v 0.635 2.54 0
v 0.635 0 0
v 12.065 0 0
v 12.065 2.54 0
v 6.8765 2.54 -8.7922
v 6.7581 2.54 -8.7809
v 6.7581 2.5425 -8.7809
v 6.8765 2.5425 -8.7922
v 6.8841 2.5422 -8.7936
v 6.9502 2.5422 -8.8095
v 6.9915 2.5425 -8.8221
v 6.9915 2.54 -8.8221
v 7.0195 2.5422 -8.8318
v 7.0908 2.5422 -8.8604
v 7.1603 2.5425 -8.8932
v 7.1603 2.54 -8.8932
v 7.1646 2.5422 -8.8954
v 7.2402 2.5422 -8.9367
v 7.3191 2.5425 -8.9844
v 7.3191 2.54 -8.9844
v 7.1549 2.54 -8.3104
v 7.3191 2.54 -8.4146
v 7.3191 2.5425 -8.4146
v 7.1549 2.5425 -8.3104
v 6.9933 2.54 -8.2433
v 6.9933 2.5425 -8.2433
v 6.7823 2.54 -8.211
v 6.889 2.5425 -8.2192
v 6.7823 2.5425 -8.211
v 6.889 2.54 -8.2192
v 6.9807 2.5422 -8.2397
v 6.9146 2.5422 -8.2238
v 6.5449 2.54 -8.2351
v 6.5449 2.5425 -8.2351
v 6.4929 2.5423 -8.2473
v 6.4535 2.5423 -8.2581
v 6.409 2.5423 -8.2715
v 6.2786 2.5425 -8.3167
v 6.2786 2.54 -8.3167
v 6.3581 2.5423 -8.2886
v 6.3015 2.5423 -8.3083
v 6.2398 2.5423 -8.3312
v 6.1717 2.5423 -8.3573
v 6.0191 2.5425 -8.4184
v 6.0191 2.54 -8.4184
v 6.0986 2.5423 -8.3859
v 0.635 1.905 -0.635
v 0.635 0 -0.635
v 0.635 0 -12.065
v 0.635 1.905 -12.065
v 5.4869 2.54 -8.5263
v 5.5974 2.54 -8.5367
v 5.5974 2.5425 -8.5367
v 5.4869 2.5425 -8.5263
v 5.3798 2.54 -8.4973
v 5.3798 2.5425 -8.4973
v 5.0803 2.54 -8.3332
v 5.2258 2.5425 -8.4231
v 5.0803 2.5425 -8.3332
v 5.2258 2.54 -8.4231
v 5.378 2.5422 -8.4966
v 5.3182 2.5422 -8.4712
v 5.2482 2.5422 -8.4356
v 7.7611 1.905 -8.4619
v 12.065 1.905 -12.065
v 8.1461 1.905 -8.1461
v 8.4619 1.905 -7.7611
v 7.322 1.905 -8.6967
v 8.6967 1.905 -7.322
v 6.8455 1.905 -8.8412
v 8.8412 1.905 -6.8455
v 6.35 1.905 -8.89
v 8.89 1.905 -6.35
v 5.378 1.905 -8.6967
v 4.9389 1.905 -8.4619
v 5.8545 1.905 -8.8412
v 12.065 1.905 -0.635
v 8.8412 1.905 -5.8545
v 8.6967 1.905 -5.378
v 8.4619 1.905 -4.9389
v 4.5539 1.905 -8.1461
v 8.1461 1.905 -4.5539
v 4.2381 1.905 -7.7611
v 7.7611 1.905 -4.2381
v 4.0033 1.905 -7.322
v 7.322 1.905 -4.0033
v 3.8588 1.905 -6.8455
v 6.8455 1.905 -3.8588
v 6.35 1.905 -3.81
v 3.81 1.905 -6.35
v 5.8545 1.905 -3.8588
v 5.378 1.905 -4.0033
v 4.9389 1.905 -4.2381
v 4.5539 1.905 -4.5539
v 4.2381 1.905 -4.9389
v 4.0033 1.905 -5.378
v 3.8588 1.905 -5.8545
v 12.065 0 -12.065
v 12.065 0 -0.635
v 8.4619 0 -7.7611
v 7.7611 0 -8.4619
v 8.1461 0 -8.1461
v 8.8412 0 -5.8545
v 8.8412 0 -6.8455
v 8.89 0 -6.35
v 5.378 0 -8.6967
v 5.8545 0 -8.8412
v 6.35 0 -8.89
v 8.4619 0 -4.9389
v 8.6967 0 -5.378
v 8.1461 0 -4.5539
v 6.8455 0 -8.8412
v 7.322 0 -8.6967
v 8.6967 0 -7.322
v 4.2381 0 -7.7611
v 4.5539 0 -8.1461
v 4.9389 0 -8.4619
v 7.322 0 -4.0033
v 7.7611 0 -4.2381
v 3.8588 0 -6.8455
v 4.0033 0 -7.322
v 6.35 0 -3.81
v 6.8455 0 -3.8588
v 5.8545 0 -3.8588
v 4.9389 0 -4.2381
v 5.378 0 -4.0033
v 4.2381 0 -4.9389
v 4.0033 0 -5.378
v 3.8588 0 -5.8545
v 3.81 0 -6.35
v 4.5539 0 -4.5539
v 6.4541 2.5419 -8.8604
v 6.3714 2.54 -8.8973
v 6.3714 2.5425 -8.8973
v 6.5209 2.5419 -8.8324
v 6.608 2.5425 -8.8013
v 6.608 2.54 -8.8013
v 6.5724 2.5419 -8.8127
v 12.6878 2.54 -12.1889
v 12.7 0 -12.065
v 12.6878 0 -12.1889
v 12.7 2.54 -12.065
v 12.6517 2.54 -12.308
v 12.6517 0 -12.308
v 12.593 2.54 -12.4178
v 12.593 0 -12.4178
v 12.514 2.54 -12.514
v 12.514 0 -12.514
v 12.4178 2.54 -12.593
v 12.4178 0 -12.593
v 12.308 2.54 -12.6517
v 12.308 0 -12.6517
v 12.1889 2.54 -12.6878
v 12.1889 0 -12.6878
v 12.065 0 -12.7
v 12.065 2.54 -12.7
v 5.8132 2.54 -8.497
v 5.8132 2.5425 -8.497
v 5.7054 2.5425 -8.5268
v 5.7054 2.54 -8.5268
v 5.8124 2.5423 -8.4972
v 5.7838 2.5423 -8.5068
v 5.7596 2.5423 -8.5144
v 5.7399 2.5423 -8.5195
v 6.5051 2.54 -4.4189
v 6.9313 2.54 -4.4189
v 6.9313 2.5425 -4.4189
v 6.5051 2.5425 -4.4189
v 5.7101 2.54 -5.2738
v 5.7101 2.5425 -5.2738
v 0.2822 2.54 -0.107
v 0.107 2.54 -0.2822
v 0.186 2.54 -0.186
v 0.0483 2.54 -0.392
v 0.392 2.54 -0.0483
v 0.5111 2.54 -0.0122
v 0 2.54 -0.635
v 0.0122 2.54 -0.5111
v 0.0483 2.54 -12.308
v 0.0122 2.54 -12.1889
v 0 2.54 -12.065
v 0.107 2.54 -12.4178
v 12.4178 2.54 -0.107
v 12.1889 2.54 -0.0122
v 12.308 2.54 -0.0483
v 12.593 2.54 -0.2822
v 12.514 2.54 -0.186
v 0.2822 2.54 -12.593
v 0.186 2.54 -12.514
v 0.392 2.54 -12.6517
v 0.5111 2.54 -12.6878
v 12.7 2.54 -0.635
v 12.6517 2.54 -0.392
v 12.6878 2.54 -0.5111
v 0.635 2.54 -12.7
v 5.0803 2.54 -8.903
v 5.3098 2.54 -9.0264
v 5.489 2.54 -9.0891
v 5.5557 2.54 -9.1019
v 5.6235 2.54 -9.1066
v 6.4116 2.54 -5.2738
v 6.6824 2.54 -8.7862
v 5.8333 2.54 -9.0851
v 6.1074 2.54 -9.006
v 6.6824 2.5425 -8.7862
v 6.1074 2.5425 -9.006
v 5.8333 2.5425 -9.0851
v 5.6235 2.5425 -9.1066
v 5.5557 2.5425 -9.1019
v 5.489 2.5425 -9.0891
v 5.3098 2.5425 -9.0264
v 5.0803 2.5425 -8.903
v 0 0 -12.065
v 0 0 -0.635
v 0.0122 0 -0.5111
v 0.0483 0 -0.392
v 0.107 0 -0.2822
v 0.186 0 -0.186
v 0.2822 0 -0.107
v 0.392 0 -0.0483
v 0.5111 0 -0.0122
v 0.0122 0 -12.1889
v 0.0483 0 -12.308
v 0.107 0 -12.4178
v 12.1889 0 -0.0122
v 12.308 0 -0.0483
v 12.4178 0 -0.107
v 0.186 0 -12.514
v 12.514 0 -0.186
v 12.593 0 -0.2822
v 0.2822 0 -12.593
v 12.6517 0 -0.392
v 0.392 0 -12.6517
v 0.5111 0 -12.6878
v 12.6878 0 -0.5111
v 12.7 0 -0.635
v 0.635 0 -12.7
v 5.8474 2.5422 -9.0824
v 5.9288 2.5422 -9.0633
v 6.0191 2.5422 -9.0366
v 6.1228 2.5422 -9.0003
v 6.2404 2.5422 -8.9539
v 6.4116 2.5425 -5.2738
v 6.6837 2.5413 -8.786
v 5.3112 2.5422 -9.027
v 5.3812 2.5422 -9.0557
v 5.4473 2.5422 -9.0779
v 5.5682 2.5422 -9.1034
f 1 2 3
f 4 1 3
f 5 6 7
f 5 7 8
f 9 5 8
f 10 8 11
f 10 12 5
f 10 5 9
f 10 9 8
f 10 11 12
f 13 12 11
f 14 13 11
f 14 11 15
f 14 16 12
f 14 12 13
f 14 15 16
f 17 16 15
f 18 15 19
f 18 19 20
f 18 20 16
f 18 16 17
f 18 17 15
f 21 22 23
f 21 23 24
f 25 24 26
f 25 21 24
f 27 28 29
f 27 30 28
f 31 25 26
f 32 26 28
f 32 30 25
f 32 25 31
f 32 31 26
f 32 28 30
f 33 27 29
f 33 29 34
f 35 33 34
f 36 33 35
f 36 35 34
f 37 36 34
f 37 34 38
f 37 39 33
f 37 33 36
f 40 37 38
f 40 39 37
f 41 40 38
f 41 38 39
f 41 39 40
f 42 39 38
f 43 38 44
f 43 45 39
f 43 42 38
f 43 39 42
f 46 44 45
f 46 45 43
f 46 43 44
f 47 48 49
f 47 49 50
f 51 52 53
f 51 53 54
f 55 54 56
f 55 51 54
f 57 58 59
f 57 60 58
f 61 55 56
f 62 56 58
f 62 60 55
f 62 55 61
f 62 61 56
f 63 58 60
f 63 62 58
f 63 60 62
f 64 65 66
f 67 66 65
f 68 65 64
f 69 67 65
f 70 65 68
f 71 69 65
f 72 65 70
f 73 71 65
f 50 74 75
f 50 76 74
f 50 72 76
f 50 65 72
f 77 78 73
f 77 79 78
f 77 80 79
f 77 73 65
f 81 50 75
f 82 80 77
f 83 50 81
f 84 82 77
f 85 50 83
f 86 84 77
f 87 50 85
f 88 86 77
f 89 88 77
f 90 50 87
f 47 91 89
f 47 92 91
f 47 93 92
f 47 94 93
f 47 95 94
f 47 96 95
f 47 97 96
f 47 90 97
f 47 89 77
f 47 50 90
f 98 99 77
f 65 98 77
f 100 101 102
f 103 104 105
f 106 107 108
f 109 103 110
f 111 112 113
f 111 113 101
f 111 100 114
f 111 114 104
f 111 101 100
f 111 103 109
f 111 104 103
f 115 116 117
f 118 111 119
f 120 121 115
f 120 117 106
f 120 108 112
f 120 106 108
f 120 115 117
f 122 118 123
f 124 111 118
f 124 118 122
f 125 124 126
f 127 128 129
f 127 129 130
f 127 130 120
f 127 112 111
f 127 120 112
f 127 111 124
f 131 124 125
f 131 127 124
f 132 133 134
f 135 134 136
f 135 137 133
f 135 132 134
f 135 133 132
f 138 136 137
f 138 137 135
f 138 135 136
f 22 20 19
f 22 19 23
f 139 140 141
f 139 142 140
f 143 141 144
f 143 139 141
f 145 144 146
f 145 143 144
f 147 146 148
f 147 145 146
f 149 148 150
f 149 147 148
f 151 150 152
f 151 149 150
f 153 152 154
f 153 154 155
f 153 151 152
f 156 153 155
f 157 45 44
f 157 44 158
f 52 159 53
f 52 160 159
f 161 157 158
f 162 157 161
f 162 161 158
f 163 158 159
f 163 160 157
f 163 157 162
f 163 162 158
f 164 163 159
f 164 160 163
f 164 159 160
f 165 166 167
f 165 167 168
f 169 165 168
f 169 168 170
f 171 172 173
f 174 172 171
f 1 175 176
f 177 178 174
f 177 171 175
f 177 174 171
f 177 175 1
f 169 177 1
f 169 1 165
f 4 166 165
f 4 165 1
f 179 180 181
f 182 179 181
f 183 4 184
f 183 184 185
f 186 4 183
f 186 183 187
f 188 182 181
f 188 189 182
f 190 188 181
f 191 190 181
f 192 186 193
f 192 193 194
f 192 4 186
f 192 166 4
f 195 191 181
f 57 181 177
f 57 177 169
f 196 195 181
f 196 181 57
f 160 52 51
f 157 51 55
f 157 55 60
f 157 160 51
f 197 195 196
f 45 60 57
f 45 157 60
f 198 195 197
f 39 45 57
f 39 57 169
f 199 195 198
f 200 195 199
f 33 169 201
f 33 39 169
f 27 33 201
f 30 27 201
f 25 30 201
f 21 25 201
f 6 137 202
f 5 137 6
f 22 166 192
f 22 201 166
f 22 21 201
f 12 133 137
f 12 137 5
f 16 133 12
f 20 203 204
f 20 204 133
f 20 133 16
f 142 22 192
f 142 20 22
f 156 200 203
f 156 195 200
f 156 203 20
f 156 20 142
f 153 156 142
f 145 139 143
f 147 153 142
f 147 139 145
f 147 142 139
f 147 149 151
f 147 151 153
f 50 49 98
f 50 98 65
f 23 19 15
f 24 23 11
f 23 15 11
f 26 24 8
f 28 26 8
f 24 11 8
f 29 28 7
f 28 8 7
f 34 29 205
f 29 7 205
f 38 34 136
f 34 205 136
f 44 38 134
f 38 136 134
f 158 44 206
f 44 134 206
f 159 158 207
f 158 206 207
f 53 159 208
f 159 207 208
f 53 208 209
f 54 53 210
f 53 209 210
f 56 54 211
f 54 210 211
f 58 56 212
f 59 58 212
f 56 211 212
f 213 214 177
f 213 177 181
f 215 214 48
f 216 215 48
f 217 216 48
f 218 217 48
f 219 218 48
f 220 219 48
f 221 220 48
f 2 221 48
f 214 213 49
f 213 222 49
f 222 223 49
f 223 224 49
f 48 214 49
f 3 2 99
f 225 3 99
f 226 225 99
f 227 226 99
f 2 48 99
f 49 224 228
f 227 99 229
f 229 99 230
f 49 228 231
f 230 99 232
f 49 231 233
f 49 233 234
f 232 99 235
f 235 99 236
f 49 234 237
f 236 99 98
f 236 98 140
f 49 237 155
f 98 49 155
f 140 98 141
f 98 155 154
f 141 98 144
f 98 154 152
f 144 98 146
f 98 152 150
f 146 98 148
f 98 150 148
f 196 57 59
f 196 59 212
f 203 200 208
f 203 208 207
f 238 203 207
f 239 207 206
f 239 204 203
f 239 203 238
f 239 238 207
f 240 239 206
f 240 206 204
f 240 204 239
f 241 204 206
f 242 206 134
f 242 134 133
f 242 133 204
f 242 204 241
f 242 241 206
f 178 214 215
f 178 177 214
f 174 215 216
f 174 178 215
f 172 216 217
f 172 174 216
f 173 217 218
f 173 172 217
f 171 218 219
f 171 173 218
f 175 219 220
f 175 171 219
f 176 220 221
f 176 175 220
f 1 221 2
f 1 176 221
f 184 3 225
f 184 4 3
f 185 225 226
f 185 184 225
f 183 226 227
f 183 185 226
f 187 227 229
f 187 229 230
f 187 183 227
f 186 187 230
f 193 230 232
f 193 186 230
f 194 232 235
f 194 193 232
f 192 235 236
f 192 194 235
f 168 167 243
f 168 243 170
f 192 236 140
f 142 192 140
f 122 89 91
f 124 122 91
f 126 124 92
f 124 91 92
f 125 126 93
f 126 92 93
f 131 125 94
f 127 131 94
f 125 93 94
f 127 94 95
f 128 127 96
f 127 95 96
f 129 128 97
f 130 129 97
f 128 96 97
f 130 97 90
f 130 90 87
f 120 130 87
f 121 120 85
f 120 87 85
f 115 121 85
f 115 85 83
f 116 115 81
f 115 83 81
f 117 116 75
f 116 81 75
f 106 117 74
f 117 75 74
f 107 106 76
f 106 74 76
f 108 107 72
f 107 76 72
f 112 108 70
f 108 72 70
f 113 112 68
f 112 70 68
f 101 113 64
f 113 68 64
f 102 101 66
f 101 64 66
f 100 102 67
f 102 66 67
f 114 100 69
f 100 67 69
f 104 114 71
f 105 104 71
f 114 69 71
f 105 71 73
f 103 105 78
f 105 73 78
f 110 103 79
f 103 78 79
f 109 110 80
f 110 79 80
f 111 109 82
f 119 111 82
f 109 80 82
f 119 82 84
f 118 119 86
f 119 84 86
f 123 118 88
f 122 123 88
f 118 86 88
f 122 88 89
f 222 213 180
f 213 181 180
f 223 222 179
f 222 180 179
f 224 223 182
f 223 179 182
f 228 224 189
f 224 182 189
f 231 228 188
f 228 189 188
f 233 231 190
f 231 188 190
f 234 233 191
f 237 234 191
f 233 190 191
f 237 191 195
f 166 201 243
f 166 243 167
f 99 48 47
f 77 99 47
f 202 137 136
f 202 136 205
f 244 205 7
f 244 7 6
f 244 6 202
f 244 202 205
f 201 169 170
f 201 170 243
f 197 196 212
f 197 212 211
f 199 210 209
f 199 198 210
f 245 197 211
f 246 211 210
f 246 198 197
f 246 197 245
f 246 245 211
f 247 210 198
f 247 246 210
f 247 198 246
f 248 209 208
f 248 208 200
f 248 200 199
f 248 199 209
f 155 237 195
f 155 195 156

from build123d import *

# Parameters (mm, degrees)
SKETCH1_W           = 12.7
SKETCH1_H           = 12.7
BOSS_EXTRUDE1_DEPTH = 2.54
FILLET1_R           = 0.635
SHELL1_START        = 0.635
SHELL1_OUTLINE_W    = 1.905
SHELL1_OUTLINE_H    = 11.43
SHELL1_DEPTH        = 11.43
SKETCH2_R           = 2.54
BOSS_EXTRUDE2_DEPTH = 1.905
BOSS_EXTRUDE3_DEPTH = 0.00254


# Read off the part's stored shape, not the designer's step: Shell1
with BuildPart() as part:
    # Sketch1 → Boss-Extrude1 (new body)
    with BuildSketch(Plane(origin=(0, 0, 0), x_dir=(1, 0, 0), z_dir=(0, 1, 0))):
        with Locations((6.35, 6.35)):
            Rectangle(SKETCH1_W, SKETCH1_H)
    extrude(amount=BOSS_EXTRUDE1_DEPTH)

    # Fillet1
    fillet1_edges = [part.edges().sort_by_distance(p)[0] for p in [
        (0, 1.27, -12.7),
        (12.7, 1.27, -12.7),
        (12.7, 1.27, 0),
        (0, 1.27, 0),
    ]]
    fillet(fillet1_edges, radius=FILLET1_R)

    # Shell1 outline → Shell1 (cut)
    with BuildSketch(Plane.YZ.offset(SHELL1_START)):
        with Locations((0.9525, -6.35)):
            Rectangle(SHELL1_OUTLINE_W, SHELL1_OUTLINE_H)
    extrude(amount=SHELL1_DEPTH, mode=Mode.SUBTRACT)

    # Sketch2 → Boss-Extrude2 (add)
    with BuildSketch(Plane(origin=(0, 1.905, 0), x_dir=(-1, 0, 0), z_dir=(0, -1, 0))):
        with Locations(Location((-6.35, 6.35, 0), (0, 0, 270))):
            Circle(SKETCH2_R)
    extrude(amount=BOSS_EXTRUDE2_DEPTH)

    # Sketch3 → Boss-Extrude3 (add)
    with BuildSketch(Plane(origin=(0, 2.54, 0), x_dir=(1, 0, 0), z_dir=(0, 1, 0))):
        Polygon((6.411642829, 5.27375641), (6.931269231, 4.418948718), (6.50513742, 4.418948718), (5.710115385, 5.27375641), align=None)
        with BuildLine():
            Line((5.080325641, 8.333153846), (5.080325641, 8.903025641))
            add(Edge.make_bspline(
                [(5.080325641, 8.903025641), (5.107116622, 8.919158467), (5.158856938, 8.950315128), (5.235918867, 8.991651266), (5.309205163, 9.027027273), (5.379088546, 9.055681099), (5.445318097, 9.07824066), (5.507802803, 9.094263611), (5.566750704, 9.104549048), (5.605002578, 9.105899018), (5.623484696, 9.106551282)],
                knots=[0, 0, 0, 0, 1.279207482, 2.470480605, 3.576080812, 4.606860037, 5.558565817, 6.435744397, 7.244200283, 8, 8, 8, 8], degree=3))
            add(Edge.make_bspline(
                [(5.623484696, 9.106551282), (5.647252633, 9.10608216), (5.696197248, 9.10511611), (5.770940929, 9.096225937), (5.849121635, 9.082896049), (5.932404463, 9.063232193), (6.024309741, 9.035772523), (6.128219217, 8.999075098), (6.245748934, 8.952611932), (6.327892985, 8.91646479), (6.371441426, 8.897301482)],
                knots=[0, 0, 0, 0, 0.728864224, 1.500928647, 2.306032779, 3.161048191, 4.124103712, 5.247132966, 6.540575143, 8, 8, 8, 8], degree=3))
            add(Edge.make_bspline(
                [(6.371441426, 8.897301482), (6.398937756, 8.884854189), (6.448424397, 8.862452119), (6.515501601, 8.834429807), (6.566641046, 8.814091133), (6.596124718, 8.804955011), (6.608039984, 8.801262821)],
                knots=[0, 0, 0, 0, 1.417318505, 2.550825291, 3.414343566, 4, 4, 4, 4], degree=3))
            add(Edge.make_bspline(
                [(6.608039984, 8.801262821), (6.633154743, 8.795327171), (6.682531311, 8.783657459), (6.733229124, 8.781815384), (6.758140144, 8.780910256)],
                knots=[0, 0, 0, 0, 1.01727437, 2, 2, 2, 2], degree=3))
            add(Edge.make_bspline(
                [(6.758140144, 8.780910256), (6.778737764, 8.781558102), (6.820988878, 8.782887003), (6.885281854, 8.792925647), (6.951980152, 8.809139744), (7.021102843, 8.831372247), (7.092577195, 8.860369751), (7.166290369, 8.895358707), (7.242337948, 8.937076476), (7.292957038, 8.968303502), (7.319107692, 8.984435897)],
                knots=[0, 0, 0, 0, 0.817691354, 1.677299118, 2.577777856, 3.541554841, 4.557701377, 5.638471298, 6.779995431, 8, 8, 8, 8], degree=3))
            Line((7.319107692, 8.984435897), (7.319107692, 8.414564103))
            add(Edge.make_bspline(
                [(7.319107692, 8.414564103), (7.296635434, 8.398350673), (7.252631937, 8.366602748), (7.184346346, 8.325219904), (7.116456359, 8.290374664), (7.049081778, 8.261073651), (6.981942418, 8.239048359), (6.915204166, 8.222851078), (6.848756076, 8.21290154), (6.804390317, 8.211657593), (6.782308814, 8.211038462)],
                knots=[0, 0, 0, 0, 1.138472114, 2.229270987, 3.277482784, 4.272796559, 5.24538971, 6.177327133, 7.09282843, 8, 8, 8, 8], degree=3))
            add(Edge.make_bspline(
                [(6.782308814, 8.211038462), (6.734070736, 8.212764993), (6.636621448, 8.216252887), (6.527110127, 8.237556451), (6.451666575, 8.258503219), (6.406550833, 8.271812301), (6.356134507, 8.289361286), (6.29953379, 8.308711319), (6.237551107, 8.332007692), (6.169954271, 8.357956857), (6.096218469, 8.386587733), (6.04555015, 8.407472659), (6.01908766, 8.418380208)],
                knots=[0, 0, 0, 0, 1.816478987, 3.669602728, 4.183070076, 4.766772394, 5.441136484, 6.19386005, 7.020227999, 7.935420581, 8.921734247, 10, 10, 10, 10], degree=3))
            add(Edge.make_bspline(
                [(6.01908766, 8.418380208), (6.002332613, 8.424935618), (5.970509168, 8.437386536), (5.925038155, 8.455476927), (5.883685286, 8.471352947), (5.846629194, 8.48526161), (5.813753702, 8.496906564), (5.785288756, 8.506272562), (5.761265135, 8.514230216), (5.723286502, 8.52375686), (5.669365237, 8.534055878), (5.621424075, 8.535803844), (5.597407973, 8.536679487)],
                knots=[0, 0, 0, 0, 1.224273616, 2.325305503, 3.329974039, 4.238366513, 5.01858254, 5.702877263, 6.277757238, 6.739620974, 8.366714654, 10, 10, 10, 10], degree=3))
            add(Edge.make_bspline(
                [(5.597407973, 8.536679487), (5.579145964, 8.536202288), (5.542464937, 8.535243786), (5.487640677, 8.527022953), (5.432392514, 8.515183006), (5.375489546, 8.496720769), (5.313776653, 8.469947593), (5.24415197, 8.43419635), (5.164904001, 8.387896903), (5.109853792, 8.352265842), (5.080325641, 8.333153846)],
                knots=[0, 0, 0, 0, 0.776252433, 1.559178841, 2.353291584, 3.177347174, 4.098437677, 5.211375113, 6.504221197, 8, 8, 8, 8], degree=3))
        make_face()
    extrude(amount=BOSS_EXTRUDE3_DEPTH)


solid = part.part
